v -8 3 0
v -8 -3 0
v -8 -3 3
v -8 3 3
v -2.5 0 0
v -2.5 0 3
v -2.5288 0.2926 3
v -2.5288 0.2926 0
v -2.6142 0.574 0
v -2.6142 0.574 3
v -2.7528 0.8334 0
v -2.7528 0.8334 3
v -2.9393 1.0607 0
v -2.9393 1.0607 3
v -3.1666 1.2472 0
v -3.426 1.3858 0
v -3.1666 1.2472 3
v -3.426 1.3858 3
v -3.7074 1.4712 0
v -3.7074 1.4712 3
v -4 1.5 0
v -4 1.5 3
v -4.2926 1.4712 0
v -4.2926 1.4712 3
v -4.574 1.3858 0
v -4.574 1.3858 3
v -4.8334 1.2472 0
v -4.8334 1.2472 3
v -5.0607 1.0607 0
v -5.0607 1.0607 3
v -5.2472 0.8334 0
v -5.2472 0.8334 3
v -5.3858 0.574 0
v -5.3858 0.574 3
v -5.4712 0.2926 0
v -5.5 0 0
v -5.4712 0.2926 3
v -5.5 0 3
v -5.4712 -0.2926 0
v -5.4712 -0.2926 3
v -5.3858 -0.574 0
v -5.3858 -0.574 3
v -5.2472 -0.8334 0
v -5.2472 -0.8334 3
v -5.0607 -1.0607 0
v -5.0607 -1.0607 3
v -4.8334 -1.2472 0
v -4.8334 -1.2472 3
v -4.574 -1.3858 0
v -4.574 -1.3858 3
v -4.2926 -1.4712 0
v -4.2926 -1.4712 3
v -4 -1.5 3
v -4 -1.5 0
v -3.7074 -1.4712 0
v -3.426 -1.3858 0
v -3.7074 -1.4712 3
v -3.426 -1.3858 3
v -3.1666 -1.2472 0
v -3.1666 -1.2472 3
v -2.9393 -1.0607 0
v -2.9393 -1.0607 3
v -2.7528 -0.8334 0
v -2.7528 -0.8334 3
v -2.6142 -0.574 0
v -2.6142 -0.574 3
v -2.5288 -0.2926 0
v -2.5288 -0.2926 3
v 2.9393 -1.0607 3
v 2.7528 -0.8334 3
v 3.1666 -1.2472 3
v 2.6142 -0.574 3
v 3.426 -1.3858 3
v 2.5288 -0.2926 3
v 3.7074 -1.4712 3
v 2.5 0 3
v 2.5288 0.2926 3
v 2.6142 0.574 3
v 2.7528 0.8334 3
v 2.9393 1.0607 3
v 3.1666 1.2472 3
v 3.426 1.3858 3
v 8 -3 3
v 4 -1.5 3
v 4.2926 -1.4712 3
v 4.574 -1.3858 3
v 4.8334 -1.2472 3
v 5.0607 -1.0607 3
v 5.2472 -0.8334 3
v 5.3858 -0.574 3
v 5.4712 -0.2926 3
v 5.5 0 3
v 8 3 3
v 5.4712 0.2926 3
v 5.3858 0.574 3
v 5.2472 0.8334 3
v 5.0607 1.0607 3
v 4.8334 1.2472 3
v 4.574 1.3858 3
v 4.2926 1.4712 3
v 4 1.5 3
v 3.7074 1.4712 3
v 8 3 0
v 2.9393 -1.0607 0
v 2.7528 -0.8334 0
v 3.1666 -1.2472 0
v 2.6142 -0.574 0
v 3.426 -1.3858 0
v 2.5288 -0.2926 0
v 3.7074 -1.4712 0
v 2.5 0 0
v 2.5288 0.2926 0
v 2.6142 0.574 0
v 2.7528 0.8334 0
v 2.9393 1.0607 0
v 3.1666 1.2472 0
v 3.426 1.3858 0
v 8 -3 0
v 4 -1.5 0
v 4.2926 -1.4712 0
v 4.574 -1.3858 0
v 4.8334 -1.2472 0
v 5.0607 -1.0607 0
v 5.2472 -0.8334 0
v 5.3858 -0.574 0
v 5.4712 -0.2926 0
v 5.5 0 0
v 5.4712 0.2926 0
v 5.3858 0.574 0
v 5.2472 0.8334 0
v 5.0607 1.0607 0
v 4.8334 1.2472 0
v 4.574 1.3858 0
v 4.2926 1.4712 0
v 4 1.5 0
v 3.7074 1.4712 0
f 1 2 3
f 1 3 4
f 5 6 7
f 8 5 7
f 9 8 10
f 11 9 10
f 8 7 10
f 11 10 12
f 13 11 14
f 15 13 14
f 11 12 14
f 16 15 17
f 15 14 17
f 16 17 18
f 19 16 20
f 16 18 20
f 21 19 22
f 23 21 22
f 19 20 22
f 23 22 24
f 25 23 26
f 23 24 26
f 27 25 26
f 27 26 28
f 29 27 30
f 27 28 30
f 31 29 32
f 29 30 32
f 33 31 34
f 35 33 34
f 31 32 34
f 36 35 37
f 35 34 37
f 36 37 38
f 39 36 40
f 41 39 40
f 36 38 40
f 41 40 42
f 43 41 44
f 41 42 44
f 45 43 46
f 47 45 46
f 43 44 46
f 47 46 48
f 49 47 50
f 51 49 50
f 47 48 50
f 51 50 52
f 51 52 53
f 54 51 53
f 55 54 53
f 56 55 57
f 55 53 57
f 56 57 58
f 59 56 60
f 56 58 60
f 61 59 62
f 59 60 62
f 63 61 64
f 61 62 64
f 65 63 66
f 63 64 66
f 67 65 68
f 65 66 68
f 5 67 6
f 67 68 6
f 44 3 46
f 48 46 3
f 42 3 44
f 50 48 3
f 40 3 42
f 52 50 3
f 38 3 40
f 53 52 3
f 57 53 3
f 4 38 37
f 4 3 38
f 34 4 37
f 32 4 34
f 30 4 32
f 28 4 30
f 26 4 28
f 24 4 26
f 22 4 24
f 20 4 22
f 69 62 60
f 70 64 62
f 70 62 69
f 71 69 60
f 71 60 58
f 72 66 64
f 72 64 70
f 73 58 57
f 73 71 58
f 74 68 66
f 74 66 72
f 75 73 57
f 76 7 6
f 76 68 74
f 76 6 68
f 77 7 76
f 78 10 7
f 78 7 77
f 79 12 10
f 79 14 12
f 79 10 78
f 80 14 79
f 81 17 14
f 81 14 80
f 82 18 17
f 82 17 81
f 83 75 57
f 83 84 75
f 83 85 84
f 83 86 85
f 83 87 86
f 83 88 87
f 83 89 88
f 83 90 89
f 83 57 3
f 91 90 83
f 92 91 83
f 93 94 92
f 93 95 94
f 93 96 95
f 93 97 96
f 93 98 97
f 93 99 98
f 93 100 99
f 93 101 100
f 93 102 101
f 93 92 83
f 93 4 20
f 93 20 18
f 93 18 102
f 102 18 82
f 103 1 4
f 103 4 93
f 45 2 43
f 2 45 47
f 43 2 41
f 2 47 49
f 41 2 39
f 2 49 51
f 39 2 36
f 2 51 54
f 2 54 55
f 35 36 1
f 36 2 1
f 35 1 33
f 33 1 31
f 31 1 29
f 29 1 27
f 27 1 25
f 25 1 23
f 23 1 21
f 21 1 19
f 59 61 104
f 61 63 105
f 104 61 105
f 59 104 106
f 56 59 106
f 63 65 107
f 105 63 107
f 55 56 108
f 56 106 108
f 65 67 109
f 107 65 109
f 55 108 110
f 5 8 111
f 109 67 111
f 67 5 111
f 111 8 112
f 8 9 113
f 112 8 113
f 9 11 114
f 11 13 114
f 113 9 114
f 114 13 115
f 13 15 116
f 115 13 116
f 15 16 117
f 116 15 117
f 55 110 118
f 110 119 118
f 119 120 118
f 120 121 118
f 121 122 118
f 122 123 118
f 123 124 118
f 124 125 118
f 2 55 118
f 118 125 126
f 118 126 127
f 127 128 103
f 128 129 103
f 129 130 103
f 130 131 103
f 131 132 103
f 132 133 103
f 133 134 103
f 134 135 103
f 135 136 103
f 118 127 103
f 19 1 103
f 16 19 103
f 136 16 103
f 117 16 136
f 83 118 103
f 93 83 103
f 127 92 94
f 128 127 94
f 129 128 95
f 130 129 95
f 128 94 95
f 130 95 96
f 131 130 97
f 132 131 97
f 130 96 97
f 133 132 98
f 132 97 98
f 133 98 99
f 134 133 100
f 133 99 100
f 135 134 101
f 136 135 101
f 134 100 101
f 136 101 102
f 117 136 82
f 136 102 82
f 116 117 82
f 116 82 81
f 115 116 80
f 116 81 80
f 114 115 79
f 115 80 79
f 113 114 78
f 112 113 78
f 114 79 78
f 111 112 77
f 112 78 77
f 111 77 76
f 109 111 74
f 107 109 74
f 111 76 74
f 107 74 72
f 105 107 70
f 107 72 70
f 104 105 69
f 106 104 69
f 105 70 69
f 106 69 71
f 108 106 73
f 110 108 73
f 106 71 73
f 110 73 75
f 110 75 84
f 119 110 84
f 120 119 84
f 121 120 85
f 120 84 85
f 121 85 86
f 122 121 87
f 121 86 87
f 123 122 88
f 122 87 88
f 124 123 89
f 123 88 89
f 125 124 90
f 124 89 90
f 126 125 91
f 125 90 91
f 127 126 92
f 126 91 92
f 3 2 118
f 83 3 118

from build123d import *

# Parameters (mm, degrees)
SKETCH_1_W          = 16
SKETCH_1_H          = 6
EXTRUDE_1_DEPTH     = 3
SKETCH_2_R          = 1.5
CUT_EXTRUDE_1_DEPTH = 3


with BuildPart() as part:
    # ｽｹｯﾁ1 → ﾎﾞｽ - 押し出し1 (new body)
    with BuildSketch(Plane.XY):
        Rectangle(SKETCH_1_W, SKETCH_1_H)
    extrude(amount=EXTRUDE_1_DEPTH)

    # ｽｹｯﾁ2 → ｶｯﾄ - 押し出し1 (cut)
    with BuildSketch(Plane.XY.offset(3)):
        with Locations((-4, 0)):
            Circle(SKETCH_2_R)
        with Locations((4, 0)):
            Circle(SKETCH_2_R)
    extrude(amount=-CUT_EXTRUDE_1_DEPTH, mode=Mode.SUBTRACT)


solid = part.part
